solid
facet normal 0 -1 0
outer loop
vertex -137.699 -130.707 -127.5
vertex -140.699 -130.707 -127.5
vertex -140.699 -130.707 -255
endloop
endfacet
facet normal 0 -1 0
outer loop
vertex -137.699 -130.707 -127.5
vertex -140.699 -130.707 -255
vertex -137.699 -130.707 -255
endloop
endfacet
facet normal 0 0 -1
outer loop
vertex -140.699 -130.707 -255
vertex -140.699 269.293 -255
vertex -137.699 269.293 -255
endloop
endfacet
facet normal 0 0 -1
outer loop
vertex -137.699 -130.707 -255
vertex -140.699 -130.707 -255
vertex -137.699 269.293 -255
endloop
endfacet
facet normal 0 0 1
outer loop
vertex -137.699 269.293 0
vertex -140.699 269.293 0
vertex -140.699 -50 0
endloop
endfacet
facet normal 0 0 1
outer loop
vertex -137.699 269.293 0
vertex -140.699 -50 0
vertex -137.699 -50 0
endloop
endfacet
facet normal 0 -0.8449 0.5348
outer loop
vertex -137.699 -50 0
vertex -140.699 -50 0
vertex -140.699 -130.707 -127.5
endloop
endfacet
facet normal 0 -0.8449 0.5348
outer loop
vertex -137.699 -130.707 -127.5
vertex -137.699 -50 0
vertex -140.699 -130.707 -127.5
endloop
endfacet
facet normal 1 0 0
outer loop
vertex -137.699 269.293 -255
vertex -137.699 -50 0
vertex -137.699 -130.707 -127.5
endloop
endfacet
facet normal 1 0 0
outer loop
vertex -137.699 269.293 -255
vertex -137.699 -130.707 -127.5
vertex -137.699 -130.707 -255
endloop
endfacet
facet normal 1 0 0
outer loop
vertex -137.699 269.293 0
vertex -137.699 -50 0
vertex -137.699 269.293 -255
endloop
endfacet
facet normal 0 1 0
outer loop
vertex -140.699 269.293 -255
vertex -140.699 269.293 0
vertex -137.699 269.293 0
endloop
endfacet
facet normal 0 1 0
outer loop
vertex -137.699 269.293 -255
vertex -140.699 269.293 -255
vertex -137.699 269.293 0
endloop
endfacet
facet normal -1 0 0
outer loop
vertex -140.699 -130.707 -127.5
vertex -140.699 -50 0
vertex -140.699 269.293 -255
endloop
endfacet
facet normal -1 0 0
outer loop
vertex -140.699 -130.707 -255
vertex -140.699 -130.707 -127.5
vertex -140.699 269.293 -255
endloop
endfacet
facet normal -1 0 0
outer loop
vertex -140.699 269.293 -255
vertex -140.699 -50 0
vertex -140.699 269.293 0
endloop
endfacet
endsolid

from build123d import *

# Parameters (mm, degrees)
SKETCH1_W           = 3
SKETCH1_H           = 400
BOSS_EXTRUDE1_DEPTH = 255
CUT_EXTRUDE1_DEPTH  = 371.88080499


with BuildPart() as part:
    # Sketch1 → Boss-Extrude1 (new body)
    with BuildSketch(Plane.XY):
        with Locations((-139.199495781, 69.292724577)):
            Rectangle(SKETCH1_W, SKETCH1_H)
    extrude(amount=-BOSS_EXTRUDE1_DEPTH)

    # Sketch2 → Cut-Extrude1 (cut, through all)
    with BuildSketch(Plane.ZY.offset(140.699495781)):
        Polygon((0, -130.707275423), (0, -50), (-127.5, -130.707275423), align=None)
    extrude(amount=-CUT_EXTRUDE1_DEPTH, mode=Mode.SUBTRACT)


solid = part.part
